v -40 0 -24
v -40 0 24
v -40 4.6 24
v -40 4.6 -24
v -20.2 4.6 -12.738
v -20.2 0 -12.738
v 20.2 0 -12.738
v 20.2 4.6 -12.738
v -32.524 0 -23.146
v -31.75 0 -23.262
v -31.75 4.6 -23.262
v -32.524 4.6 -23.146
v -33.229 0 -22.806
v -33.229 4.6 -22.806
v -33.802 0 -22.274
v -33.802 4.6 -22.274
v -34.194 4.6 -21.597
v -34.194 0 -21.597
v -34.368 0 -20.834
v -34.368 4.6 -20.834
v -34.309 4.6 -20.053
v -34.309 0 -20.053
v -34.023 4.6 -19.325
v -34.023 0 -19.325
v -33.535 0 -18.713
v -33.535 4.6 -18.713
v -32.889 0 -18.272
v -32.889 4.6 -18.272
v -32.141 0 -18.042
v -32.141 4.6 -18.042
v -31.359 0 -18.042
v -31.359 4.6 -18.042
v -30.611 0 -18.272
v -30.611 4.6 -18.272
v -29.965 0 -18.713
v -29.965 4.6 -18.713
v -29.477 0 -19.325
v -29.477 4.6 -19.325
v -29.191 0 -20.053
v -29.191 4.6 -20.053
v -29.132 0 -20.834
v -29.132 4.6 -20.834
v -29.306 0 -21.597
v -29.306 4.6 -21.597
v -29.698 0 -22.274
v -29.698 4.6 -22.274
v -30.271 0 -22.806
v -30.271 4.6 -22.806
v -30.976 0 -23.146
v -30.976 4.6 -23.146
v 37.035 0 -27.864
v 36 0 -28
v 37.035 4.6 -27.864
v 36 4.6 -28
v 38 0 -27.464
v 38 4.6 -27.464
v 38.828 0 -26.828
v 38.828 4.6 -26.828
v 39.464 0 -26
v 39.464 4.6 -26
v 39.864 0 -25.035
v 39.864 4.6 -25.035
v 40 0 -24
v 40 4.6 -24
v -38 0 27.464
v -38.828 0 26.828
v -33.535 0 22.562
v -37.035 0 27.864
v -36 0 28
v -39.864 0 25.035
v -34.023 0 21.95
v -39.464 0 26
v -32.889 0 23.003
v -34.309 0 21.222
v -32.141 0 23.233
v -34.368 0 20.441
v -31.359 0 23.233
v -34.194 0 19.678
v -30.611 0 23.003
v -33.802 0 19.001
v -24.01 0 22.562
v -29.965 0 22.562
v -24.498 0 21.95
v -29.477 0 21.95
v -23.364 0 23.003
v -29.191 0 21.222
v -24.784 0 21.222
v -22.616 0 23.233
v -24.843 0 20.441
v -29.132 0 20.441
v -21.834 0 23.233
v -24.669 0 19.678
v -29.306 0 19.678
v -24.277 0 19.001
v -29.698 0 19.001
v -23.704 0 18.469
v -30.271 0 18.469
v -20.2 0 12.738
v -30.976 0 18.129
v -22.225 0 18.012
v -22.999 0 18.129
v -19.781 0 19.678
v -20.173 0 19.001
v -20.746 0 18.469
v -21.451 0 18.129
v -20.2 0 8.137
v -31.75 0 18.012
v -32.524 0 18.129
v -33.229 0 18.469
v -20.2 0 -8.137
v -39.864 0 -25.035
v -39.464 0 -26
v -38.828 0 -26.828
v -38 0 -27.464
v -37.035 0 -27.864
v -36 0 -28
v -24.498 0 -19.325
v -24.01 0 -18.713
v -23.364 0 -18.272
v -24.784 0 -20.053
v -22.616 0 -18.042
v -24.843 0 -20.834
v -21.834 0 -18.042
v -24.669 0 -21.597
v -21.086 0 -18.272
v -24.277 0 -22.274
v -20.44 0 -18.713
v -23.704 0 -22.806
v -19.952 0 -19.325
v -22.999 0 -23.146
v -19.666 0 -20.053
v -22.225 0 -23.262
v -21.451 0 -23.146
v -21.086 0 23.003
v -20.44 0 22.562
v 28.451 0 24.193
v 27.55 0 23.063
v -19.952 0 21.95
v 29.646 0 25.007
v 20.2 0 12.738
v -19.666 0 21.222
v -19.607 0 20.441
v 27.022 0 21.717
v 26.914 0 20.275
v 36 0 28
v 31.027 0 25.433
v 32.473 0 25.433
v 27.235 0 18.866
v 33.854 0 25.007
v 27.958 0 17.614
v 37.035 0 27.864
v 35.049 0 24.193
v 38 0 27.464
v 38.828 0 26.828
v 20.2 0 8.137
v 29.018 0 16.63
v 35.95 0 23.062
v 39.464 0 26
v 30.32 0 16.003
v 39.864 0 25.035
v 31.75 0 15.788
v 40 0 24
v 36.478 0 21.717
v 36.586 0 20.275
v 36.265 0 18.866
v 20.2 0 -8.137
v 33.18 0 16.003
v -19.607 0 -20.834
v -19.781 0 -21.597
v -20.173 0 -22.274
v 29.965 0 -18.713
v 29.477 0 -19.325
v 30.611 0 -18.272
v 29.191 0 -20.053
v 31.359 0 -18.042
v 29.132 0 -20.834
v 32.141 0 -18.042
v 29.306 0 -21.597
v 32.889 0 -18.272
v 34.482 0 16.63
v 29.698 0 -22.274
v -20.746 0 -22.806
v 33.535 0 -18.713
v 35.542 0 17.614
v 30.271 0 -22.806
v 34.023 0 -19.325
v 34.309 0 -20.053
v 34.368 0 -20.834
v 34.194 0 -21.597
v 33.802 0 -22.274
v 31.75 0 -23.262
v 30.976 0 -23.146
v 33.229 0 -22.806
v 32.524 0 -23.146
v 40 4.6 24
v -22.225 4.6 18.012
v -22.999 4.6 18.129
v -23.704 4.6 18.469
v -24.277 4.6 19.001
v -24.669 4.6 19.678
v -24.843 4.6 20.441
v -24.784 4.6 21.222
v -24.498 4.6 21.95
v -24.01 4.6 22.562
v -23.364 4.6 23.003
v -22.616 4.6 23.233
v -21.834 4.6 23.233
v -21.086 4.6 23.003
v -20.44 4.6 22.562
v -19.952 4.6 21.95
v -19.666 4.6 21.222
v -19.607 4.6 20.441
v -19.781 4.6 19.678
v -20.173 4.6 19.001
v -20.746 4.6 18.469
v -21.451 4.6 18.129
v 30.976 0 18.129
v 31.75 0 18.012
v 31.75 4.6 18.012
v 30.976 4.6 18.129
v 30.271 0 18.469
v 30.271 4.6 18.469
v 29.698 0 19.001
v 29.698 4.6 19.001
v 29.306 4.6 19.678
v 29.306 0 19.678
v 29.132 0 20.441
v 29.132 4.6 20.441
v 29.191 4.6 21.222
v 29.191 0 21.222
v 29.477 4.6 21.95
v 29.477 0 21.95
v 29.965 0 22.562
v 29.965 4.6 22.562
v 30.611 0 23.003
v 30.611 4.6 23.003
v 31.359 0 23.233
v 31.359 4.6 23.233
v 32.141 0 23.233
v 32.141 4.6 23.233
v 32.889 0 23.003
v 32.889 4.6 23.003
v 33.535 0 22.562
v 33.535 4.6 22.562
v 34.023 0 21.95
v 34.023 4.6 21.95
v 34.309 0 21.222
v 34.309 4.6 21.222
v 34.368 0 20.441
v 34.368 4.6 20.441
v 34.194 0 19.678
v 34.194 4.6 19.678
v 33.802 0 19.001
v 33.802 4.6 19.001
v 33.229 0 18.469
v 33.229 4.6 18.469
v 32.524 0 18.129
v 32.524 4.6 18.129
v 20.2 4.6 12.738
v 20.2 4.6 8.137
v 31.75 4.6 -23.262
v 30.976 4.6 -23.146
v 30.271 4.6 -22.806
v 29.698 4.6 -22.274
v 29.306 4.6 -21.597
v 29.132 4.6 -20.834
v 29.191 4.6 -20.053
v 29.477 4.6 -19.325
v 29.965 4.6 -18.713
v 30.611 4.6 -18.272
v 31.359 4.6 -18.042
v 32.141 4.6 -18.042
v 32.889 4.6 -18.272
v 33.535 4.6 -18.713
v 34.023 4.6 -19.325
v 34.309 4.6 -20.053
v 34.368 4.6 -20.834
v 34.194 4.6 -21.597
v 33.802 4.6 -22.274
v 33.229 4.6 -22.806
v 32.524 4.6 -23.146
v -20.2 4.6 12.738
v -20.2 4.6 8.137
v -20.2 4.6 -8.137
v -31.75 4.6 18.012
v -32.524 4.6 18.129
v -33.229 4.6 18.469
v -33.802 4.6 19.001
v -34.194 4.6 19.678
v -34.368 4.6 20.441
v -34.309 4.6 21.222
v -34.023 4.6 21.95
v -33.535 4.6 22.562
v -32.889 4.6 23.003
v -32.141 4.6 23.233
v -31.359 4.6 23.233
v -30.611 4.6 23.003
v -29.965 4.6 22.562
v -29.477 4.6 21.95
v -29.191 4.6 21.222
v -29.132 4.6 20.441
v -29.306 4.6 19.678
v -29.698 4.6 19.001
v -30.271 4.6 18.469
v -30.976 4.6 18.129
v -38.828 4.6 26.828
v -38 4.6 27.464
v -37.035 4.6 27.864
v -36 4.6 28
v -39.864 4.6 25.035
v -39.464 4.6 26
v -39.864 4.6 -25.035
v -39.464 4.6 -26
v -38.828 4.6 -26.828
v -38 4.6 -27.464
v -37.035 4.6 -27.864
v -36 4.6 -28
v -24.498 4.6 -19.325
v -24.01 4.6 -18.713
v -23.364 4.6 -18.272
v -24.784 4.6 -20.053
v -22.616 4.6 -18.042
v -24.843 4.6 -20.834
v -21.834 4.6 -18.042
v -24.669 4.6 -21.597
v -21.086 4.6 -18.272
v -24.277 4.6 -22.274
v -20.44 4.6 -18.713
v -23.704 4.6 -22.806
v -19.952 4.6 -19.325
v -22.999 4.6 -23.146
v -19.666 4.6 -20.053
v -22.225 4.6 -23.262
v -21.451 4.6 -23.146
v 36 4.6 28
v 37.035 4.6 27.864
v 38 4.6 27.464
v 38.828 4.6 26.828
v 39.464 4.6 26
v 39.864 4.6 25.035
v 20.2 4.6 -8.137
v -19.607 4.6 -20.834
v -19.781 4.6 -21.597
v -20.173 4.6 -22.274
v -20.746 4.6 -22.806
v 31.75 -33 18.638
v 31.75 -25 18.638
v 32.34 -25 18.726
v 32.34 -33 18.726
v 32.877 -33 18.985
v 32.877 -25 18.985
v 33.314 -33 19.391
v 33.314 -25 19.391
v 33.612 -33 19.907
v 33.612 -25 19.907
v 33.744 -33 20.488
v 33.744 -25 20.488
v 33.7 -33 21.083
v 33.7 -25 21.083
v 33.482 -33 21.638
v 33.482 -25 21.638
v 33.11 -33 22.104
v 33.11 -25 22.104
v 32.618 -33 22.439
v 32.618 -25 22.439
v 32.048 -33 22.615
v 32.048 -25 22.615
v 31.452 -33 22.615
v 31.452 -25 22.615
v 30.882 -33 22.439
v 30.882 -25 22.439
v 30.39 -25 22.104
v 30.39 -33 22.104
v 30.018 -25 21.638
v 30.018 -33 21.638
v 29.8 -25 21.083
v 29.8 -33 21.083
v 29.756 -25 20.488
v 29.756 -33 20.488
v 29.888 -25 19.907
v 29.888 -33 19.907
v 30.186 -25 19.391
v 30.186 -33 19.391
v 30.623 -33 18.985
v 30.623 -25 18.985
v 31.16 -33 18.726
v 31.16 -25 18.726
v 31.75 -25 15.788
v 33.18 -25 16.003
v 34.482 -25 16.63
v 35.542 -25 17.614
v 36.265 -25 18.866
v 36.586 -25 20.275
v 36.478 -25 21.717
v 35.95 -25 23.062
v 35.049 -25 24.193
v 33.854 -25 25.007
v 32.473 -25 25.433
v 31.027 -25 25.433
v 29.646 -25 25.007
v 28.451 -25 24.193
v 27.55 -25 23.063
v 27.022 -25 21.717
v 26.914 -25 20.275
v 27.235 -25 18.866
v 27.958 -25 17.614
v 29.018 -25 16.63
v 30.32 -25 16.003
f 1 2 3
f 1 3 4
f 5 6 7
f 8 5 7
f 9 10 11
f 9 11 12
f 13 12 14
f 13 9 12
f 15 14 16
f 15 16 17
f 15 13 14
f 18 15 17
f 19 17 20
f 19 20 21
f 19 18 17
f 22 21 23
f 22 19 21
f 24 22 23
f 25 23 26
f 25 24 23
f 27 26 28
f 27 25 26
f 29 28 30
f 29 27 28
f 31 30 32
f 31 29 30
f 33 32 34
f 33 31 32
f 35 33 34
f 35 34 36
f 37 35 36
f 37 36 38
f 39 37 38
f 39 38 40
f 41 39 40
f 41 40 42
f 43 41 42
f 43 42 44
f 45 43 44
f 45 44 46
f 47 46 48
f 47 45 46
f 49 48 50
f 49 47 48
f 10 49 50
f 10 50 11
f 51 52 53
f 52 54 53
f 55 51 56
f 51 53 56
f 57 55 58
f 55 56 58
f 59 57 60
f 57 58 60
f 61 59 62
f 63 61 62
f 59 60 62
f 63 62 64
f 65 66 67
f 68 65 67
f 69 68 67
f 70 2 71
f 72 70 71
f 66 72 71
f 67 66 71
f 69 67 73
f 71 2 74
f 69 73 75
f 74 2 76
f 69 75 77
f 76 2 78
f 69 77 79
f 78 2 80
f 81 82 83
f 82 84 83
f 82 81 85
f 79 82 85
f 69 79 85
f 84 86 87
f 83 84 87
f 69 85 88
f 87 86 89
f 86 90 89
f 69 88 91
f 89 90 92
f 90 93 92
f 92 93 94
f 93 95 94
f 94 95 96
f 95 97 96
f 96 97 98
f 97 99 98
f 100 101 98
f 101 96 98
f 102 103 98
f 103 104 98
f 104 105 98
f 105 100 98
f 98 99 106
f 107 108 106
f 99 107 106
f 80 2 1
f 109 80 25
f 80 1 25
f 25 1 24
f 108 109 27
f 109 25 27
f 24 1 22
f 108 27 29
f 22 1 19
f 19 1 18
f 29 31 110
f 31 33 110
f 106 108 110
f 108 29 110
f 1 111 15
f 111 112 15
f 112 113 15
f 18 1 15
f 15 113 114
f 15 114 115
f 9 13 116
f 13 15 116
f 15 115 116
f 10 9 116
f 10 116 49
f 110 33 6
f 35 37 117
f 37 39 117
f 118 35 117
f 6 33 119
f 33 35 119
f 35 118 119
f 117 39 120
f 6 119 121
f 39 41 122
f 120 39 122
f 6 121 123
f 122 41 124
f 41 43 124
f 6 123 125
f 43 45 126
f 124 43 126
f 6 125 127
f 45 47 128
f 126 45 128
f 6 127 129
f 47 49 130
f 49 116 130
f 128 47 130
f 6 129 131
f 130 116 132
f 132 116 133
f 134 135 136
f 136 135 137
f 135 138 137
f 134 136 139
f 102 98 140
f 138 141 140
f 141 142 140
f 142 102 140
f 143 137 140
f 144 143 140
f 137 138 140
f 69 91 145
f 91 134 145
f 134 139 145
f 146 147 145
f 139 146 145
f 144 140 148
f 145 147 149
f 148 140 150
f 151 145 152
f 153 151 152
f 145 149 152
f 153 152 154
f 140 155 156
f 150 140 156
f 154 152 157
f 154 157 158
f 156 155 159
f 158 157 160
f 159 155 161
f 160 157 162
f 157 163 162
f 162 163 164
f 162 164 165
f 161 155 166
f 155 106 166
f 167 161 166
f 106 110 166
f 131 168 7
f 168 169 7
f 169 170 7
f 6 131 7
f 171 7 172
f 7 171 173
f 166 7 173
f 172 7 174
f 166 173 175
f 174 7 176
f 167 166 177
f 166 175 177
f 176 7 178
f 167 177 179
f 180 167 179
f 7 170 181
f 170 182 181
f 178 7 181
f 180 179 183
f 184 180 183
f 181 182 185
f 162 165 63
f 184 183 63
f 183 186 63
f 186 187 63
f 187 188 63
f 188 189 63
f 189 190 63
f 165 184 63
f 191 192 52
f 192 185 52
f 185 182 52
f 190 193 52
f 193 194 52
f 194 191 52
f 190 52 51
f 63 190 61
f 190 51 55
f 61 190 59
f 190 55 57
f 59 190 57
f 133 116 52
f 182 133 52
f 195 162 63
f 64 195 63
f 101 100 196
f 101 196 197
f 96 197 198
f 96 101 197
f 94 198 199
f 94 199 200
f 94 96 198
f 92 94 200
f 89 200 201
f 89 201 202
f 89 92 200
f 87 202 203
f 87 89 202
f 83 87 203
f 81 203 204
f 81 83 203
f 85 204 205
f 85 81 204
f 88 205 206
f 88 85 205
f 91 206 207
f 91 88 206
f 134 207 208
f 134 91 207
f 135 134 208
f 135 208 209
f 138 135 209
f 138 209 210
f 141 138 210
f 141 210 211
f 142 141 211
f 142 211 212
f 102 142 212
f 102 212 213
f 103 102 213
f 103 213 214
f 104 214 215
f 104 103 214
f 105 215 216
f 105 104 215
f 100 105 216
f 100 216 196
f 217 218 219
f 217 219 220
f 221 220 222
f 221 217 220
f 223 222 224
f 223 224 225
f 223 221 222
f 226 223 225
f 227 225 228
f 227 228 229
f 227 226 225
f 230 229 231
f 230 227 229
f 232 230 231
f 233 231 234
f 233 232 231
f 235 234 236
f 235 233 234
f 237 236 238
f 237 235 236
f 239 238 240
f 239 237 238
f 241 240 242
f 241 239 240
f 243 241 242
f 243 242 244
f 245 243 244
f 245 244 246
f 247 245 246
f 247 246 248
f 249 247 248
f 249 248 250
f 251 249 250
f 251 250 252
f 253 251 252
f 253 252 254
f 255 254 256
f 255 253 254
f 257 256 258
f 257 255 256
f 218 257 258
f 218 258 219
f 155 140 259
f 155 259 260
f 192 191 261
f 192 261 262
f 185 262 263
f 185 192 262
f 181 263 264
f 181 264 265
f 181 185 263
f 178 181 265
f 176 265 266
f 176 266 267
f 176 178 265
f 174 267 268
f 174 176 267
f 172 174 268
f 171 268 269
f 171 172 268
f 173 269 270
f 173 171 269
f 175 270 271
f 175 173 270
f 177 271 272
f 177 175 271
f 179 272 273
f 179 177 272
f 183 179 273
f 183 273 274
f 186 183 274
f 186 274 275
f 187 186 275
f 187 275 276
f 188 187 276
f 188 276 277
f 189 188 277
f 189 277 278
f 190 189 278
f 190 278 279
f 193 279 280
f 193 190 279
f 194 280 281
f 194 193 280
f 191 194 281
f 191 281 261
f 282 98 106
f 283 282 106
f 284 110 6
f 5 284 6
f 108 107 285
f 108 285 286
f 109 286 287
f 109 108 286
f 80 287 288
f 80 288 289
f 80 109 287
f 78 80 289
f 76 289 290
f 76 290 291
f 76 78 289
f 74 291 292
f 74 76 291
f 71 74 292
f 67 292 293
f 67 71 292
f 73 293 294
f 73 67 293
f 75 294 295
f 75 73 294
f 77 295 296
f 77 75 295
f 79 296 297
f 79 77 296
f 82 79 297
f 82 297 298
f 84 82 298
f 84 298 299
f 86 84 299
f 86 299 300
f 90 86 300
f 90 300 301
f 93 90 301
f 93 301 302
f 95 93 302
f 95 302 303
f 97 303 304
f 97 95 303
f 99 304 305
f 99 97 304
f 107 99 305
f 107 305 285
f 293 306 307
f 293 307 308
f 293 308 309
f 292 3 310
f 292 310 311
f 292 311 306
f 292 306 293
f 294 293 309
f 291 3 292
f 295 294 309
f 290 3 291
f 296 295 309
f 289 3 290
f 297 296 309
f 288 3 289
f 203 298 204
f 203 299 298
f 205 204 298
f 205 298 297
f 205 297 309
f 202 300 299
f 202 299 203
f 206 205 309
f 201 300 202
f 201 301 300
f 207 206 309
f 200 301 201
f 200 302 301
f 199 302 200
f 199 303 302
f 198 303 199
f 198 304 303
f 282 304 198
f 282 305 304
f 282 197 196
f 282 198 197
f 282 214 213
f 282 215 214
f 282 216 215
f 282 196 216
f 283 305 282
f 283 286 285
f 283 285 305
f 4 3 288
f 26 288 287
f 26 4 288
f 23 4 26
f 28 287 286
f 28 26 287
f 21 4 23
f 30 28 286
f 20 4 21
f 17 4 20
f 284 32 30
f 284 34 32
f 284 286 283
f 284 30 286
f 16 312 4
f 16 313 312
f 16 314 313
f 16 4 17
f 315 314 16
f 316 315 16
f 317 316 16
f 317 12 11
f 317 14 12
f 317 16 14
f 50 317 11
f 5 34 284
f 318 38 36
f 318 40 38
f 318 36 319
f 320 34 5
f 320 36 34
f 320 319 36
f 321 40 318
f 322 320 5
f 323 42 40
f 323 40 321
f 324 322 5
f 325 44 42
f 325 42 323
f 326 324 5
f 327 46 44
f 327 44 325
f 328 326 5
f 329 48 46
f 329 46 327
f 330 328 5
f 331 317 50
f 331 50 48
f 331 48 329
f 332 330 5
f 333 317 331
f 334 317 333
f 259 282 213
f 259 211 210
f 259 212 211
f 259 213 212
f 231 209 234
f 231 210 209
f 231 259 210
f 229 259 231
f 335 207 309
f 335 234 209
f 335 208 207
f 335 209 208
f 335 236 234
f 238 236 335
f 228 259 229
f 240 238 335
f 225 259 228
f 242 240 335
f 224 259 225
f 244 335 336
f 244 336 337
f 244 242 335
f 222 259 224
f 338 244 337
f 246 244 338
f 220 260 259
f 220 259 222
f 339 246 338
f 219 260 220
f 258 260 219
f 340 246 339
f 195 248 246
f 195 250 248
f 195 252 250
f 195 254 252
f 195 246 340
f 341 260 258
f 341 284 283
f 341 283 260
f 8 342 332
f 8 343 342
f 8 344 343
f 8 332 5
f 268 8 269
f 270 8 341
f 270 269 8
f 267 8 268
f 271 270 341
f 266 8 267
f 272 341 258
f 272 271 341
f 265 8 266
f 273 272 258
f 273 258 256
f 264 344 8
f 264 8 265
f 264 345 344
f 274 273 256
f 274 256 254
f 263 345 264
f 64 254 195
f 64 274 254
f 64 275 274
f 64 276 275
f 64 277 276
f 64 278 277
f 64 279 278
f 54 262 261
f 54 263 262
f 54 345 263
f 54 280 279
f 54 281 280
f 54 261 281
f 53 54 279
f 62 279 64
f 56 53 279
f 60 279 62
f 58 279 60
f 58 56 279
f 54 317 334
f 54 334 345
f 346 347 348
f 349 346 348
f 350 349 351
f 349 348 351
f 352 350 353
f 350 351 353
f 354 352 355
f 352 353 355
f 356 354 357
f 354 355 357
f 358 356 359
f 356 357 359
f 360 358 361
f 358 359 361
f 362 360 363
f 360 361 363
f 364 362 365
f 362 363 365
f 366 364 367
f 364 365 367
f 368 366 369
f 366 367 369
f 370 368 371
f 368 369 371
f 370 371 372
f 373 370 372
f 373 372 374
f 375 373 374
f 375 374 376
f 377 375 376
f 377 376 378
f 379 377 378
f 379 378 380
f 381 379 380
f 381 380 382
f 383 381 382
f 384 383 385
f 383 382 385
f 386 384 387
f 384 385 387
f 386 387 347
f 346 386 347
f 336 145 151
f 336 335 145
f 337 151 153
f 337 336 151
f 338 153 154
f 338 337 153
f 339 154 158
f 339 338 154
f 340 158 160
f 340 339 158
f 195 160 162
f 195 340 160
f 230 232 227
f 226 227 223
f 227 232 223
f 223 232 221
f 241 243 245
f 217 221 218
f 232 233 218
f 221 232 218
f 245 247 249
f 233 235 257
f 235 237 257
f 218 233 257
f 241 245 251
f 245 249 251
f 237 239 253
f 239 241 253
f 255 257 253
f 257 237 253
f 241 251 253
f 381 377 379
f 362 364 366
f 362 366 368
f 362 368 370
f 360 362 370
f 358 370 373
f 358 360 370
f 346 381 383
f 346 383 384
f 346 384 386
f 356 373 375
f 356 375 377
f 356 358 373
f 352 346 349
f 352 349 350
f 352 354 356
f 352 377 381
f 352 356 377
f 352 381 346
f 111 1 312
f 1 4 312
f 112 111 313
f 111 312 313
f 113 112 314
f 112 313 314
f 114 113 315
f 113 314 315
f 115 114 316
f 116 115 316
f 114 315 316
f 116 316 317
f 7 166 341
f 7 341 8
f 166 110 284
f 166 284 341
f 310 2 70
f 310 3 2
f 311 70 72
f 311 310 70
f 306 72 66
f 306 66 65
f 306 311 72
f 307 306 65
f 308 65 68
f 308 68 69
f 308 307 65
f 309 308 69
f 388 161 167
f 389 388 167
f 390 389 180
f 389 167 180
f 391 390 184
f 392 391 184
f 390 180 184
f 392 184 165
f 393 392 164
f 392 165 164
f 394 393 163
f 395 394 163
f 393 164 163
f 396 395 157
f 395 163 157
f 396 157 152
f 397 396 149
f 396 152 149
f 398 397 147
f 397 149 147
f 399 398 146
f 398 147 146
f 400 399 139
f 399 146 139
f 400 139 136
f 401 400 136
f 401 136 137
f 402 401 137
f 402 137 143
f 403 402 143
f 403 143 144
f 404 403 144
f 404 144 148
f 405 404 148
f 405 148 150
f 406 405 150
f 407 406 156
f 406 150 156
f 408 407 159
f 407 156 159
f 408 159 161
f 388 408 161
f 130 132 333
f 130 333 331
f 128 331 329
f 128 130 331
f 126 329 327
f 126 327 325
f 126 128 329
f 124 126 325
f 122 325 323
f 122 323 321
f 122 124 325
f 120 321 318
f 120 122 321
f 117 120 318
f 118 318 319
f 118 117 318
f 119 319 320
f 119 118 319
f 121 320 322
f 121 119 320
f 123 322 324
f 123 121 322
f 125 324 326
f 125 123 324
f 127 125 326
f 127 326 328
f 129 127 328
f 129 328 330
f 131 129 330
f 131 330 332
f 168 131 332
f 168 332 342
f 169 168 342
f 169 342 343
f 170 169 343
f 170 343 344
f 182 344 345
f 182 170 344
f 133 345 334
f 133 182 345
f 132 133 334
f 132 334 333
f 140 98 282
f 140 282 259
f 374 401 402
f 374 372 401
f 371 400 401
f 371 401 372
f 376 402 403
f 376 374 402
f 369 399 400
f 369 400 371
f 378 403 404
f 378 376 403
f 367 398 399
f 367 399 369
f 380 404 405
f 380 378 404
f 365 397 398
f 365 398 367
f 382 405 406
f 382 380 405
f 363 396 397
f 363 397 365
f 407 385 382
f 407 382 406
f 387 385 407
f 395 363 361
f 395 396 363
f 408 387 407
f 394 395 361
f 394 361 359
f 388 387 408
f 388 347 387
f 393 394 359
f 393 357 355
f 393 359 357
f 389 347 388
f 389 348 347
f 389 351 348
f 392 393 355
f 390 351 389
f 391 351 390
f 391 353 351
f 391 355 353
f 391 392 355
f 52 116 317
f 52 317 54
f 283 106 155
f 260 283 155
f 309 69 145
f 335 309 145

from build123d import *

# Parameters (mm, degrees)
SKETCH_3_W          = 80
SKETCH_3_H          = 56
EXTRUDE_1_DEPTH     = 4.6
SKETCH_1_R          = 2.625
SKETCH_1_W          = 40.4
SKETCH_1_H          = 4.6
CUT_EXTRUDE_1_DEPTH = 4.6
SKETCH_5_R          = 4.85
EXTRUDE_2_DEPTH     = 25
SKETCH_6_R          = 2
EXTRUDE_3_DEPTH     = 8
FILLET_2_R          = 4


with BuildPart() as part:
    # 草图3 → 凸台-拉伸1 (new body)
    with BuildSketch(Plane(origin=(0, 0, 0), x_dir=(1, 0, 0), z_dir=(0, 1, 0))):
        Rectangle(SKETCH_3_W, SKETCH_3_H)
    extrude(amount=EXTRUDE_1_DEPTH)

    # 草图1 → 切除-拉伸1 (cut)
    with BuildSketch(Plane(origin=(0, 0, 0), x_dir=(1, 0, 0), z_dir=(0, 1, 0))):
        with Locations(Location((-31.75, 20.6375, 0), (0, 0, 90))):
            Circle(SKETCH_1_R)
        with Locations(Location((31.75, 20.6375, 0), (0, 0, 90))):
            Circle(SKETCH_1_R)
        with Locations(Location((31.75, -20.6375, 0), (0, 0, 90))):
            Circle(SKETCH_1_R)
        with Locations(Location((-31.75, -20.6375, 0), (0, 0, 90))):
            Circle(SKETCH_1_R)
        with Locations(Location((-22.225, 20.6375, 0), (0, 0, 90))):
            Circle(SKETCH_1_R)
        with Locations(Location((-22.225, -20.6375, 0), (0, 0, 90))):
            Circle(SKETCH_1_R)
        with Locations((0, -10.4375)):
            Rectangle(SKETCH_1_W, SKETCH_1_H)
        with Locations((0, 10.4375)):
            Rectangle(SKETCH_1_W, SKETCH_1_H)
    extrude(amount=CUT_EXTRUDE_1_DEPTH, mode=Mode.SUBTRACT)

    # 草图5 → 凸台-拉伸2 (add)
    with BuildSketch(Plane.XZ):
        with Locations(Location((31.75, 20.6375, 0), (0, 0, 270))):
            Circle(SKETCH_5_R)
    extrude(amount=EXTRUDE_2_DEPTH)

    # 草图6 → 凸台-拉伸3 (add)
    with BuildSketch(Plane.XZ.offset(25)):
        with Locations(Location((31.75, 20.6375, 0), (0, 0, 270))):
            Circle(SKETCH_6_R)
    extrude(amount=EXTRUDE_3_DEPTH)

    # 圆角2
    fillet_2_edges = [part.edges().sort_by_distance(p)[0] for p in [
        (40, 2.3, 28),
        (-40, 2.3, 28),
        (-40, 2.3, -28),
        (40, 2.3, -28),
    ]]
    fillet(fillet_2_edges, radius=FILLET_2_R)


solid = part.part
